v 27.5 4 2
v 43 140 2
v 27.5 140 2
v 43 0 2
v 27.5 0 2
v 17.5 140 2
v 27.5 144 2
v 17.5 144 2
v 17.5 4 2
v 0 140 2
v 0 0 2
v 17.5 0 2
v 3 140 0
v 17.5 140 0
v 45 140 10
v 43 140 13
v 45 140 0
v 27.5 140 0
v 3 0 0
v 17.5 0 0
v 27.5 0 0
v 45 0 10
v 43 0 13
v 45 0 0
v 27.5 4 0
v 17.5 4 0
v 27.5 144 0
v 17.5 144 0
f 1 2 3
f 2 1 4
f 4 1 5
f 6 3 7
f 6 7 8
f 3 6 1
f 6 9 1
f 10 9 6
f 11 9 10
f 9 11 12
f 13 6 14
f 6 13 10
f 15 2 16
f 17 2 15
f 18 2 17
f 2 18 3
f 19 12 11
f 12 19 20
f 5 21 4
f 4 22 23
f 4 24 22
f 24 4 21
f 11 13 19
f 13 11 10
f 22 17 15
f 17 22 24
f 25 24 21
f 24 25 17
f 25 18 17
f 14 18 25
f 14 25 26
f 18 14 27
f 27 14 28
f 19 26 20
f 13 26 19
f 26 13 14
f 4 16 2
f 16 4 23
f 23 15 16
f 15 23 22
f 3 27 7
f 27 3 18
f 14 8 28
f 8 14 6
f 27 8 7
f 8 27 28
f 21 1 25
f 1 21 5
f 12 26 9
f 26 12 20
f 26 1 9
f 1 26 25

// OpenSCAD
numberOfNails = 0;

width = 140;
height = 45;
depth = 10;
thickness = 2;
holeThickness = 3;

slopeFactor = 1.5;

tabWidth = 10;
tabDepth = 4;

module prism(l, w, h)
{
	polyhedron( // pt 0         1            2            3            4            5
	    points = [ [ 0, 0, 0 ], [ l, 0, 0 ], [ l, w, 0 ], [ 0, w, 0 ], [ 0, w, h ], [ l, w, h ] ],
	    faces = [ [ 0, 1, 2, 3 ], [ 5, 4, 3, 2 ], [ 0, 4, 5, 1 ], [ 0, 3, 4 ], [ 5, 2, 1 ] ]);
}

module nailHole(depth, thickness, position, x, y, z)
{
	translate([ x - (depth / 2), y * position, (z + depth) / 2 ])
	{
		rotate([ 0, 90, 0 ])
		{
			cylinder(d = thickness, h = depth, center = true);
		}
	}
}

module siding(length, height, depth, thickness, holeThickness)
{
	difference()
	{
		union()
		{
			// side
			translate([ thickness * slopeFactor, 0, 0 ])
			{
				mirror([ 1, 0, 1 ]) rotate([ 0, 0, 90 ])
				prism(length, thickness, thickness * slopeFactor);
				cube([ height - (thickness * slopeFactor), length, thickness ]);
			}

			// lip
			translate([ height - thickness, 0, 0 ])
			{
				cube([ thickness, length, depth ]);
				translate([ thickness, 0, depth ])
				rotate([ 0, 0, 90 ])
				prism(length, thickness, thickness * slopeFactor);
			}

			translate([(height - tabWidth) / 2, length, 0]) {
				cube([tabWidth, tabDepth, thickness]);
			}
		}

		translate([(height - tabWidth) / 2, 0, 0]) {
			cube([tabWidth, tabDepth, thickness]);
		}

		spacing = 1 / numberOfNails;

		for (positition = [spacing / 2:spacing:1 - (spacing / 2)])
			nailHole(thickness, holeThickness, positition, height, length, depth);
	}
}

siding(width, height, depth, thickness, holeThickness);
